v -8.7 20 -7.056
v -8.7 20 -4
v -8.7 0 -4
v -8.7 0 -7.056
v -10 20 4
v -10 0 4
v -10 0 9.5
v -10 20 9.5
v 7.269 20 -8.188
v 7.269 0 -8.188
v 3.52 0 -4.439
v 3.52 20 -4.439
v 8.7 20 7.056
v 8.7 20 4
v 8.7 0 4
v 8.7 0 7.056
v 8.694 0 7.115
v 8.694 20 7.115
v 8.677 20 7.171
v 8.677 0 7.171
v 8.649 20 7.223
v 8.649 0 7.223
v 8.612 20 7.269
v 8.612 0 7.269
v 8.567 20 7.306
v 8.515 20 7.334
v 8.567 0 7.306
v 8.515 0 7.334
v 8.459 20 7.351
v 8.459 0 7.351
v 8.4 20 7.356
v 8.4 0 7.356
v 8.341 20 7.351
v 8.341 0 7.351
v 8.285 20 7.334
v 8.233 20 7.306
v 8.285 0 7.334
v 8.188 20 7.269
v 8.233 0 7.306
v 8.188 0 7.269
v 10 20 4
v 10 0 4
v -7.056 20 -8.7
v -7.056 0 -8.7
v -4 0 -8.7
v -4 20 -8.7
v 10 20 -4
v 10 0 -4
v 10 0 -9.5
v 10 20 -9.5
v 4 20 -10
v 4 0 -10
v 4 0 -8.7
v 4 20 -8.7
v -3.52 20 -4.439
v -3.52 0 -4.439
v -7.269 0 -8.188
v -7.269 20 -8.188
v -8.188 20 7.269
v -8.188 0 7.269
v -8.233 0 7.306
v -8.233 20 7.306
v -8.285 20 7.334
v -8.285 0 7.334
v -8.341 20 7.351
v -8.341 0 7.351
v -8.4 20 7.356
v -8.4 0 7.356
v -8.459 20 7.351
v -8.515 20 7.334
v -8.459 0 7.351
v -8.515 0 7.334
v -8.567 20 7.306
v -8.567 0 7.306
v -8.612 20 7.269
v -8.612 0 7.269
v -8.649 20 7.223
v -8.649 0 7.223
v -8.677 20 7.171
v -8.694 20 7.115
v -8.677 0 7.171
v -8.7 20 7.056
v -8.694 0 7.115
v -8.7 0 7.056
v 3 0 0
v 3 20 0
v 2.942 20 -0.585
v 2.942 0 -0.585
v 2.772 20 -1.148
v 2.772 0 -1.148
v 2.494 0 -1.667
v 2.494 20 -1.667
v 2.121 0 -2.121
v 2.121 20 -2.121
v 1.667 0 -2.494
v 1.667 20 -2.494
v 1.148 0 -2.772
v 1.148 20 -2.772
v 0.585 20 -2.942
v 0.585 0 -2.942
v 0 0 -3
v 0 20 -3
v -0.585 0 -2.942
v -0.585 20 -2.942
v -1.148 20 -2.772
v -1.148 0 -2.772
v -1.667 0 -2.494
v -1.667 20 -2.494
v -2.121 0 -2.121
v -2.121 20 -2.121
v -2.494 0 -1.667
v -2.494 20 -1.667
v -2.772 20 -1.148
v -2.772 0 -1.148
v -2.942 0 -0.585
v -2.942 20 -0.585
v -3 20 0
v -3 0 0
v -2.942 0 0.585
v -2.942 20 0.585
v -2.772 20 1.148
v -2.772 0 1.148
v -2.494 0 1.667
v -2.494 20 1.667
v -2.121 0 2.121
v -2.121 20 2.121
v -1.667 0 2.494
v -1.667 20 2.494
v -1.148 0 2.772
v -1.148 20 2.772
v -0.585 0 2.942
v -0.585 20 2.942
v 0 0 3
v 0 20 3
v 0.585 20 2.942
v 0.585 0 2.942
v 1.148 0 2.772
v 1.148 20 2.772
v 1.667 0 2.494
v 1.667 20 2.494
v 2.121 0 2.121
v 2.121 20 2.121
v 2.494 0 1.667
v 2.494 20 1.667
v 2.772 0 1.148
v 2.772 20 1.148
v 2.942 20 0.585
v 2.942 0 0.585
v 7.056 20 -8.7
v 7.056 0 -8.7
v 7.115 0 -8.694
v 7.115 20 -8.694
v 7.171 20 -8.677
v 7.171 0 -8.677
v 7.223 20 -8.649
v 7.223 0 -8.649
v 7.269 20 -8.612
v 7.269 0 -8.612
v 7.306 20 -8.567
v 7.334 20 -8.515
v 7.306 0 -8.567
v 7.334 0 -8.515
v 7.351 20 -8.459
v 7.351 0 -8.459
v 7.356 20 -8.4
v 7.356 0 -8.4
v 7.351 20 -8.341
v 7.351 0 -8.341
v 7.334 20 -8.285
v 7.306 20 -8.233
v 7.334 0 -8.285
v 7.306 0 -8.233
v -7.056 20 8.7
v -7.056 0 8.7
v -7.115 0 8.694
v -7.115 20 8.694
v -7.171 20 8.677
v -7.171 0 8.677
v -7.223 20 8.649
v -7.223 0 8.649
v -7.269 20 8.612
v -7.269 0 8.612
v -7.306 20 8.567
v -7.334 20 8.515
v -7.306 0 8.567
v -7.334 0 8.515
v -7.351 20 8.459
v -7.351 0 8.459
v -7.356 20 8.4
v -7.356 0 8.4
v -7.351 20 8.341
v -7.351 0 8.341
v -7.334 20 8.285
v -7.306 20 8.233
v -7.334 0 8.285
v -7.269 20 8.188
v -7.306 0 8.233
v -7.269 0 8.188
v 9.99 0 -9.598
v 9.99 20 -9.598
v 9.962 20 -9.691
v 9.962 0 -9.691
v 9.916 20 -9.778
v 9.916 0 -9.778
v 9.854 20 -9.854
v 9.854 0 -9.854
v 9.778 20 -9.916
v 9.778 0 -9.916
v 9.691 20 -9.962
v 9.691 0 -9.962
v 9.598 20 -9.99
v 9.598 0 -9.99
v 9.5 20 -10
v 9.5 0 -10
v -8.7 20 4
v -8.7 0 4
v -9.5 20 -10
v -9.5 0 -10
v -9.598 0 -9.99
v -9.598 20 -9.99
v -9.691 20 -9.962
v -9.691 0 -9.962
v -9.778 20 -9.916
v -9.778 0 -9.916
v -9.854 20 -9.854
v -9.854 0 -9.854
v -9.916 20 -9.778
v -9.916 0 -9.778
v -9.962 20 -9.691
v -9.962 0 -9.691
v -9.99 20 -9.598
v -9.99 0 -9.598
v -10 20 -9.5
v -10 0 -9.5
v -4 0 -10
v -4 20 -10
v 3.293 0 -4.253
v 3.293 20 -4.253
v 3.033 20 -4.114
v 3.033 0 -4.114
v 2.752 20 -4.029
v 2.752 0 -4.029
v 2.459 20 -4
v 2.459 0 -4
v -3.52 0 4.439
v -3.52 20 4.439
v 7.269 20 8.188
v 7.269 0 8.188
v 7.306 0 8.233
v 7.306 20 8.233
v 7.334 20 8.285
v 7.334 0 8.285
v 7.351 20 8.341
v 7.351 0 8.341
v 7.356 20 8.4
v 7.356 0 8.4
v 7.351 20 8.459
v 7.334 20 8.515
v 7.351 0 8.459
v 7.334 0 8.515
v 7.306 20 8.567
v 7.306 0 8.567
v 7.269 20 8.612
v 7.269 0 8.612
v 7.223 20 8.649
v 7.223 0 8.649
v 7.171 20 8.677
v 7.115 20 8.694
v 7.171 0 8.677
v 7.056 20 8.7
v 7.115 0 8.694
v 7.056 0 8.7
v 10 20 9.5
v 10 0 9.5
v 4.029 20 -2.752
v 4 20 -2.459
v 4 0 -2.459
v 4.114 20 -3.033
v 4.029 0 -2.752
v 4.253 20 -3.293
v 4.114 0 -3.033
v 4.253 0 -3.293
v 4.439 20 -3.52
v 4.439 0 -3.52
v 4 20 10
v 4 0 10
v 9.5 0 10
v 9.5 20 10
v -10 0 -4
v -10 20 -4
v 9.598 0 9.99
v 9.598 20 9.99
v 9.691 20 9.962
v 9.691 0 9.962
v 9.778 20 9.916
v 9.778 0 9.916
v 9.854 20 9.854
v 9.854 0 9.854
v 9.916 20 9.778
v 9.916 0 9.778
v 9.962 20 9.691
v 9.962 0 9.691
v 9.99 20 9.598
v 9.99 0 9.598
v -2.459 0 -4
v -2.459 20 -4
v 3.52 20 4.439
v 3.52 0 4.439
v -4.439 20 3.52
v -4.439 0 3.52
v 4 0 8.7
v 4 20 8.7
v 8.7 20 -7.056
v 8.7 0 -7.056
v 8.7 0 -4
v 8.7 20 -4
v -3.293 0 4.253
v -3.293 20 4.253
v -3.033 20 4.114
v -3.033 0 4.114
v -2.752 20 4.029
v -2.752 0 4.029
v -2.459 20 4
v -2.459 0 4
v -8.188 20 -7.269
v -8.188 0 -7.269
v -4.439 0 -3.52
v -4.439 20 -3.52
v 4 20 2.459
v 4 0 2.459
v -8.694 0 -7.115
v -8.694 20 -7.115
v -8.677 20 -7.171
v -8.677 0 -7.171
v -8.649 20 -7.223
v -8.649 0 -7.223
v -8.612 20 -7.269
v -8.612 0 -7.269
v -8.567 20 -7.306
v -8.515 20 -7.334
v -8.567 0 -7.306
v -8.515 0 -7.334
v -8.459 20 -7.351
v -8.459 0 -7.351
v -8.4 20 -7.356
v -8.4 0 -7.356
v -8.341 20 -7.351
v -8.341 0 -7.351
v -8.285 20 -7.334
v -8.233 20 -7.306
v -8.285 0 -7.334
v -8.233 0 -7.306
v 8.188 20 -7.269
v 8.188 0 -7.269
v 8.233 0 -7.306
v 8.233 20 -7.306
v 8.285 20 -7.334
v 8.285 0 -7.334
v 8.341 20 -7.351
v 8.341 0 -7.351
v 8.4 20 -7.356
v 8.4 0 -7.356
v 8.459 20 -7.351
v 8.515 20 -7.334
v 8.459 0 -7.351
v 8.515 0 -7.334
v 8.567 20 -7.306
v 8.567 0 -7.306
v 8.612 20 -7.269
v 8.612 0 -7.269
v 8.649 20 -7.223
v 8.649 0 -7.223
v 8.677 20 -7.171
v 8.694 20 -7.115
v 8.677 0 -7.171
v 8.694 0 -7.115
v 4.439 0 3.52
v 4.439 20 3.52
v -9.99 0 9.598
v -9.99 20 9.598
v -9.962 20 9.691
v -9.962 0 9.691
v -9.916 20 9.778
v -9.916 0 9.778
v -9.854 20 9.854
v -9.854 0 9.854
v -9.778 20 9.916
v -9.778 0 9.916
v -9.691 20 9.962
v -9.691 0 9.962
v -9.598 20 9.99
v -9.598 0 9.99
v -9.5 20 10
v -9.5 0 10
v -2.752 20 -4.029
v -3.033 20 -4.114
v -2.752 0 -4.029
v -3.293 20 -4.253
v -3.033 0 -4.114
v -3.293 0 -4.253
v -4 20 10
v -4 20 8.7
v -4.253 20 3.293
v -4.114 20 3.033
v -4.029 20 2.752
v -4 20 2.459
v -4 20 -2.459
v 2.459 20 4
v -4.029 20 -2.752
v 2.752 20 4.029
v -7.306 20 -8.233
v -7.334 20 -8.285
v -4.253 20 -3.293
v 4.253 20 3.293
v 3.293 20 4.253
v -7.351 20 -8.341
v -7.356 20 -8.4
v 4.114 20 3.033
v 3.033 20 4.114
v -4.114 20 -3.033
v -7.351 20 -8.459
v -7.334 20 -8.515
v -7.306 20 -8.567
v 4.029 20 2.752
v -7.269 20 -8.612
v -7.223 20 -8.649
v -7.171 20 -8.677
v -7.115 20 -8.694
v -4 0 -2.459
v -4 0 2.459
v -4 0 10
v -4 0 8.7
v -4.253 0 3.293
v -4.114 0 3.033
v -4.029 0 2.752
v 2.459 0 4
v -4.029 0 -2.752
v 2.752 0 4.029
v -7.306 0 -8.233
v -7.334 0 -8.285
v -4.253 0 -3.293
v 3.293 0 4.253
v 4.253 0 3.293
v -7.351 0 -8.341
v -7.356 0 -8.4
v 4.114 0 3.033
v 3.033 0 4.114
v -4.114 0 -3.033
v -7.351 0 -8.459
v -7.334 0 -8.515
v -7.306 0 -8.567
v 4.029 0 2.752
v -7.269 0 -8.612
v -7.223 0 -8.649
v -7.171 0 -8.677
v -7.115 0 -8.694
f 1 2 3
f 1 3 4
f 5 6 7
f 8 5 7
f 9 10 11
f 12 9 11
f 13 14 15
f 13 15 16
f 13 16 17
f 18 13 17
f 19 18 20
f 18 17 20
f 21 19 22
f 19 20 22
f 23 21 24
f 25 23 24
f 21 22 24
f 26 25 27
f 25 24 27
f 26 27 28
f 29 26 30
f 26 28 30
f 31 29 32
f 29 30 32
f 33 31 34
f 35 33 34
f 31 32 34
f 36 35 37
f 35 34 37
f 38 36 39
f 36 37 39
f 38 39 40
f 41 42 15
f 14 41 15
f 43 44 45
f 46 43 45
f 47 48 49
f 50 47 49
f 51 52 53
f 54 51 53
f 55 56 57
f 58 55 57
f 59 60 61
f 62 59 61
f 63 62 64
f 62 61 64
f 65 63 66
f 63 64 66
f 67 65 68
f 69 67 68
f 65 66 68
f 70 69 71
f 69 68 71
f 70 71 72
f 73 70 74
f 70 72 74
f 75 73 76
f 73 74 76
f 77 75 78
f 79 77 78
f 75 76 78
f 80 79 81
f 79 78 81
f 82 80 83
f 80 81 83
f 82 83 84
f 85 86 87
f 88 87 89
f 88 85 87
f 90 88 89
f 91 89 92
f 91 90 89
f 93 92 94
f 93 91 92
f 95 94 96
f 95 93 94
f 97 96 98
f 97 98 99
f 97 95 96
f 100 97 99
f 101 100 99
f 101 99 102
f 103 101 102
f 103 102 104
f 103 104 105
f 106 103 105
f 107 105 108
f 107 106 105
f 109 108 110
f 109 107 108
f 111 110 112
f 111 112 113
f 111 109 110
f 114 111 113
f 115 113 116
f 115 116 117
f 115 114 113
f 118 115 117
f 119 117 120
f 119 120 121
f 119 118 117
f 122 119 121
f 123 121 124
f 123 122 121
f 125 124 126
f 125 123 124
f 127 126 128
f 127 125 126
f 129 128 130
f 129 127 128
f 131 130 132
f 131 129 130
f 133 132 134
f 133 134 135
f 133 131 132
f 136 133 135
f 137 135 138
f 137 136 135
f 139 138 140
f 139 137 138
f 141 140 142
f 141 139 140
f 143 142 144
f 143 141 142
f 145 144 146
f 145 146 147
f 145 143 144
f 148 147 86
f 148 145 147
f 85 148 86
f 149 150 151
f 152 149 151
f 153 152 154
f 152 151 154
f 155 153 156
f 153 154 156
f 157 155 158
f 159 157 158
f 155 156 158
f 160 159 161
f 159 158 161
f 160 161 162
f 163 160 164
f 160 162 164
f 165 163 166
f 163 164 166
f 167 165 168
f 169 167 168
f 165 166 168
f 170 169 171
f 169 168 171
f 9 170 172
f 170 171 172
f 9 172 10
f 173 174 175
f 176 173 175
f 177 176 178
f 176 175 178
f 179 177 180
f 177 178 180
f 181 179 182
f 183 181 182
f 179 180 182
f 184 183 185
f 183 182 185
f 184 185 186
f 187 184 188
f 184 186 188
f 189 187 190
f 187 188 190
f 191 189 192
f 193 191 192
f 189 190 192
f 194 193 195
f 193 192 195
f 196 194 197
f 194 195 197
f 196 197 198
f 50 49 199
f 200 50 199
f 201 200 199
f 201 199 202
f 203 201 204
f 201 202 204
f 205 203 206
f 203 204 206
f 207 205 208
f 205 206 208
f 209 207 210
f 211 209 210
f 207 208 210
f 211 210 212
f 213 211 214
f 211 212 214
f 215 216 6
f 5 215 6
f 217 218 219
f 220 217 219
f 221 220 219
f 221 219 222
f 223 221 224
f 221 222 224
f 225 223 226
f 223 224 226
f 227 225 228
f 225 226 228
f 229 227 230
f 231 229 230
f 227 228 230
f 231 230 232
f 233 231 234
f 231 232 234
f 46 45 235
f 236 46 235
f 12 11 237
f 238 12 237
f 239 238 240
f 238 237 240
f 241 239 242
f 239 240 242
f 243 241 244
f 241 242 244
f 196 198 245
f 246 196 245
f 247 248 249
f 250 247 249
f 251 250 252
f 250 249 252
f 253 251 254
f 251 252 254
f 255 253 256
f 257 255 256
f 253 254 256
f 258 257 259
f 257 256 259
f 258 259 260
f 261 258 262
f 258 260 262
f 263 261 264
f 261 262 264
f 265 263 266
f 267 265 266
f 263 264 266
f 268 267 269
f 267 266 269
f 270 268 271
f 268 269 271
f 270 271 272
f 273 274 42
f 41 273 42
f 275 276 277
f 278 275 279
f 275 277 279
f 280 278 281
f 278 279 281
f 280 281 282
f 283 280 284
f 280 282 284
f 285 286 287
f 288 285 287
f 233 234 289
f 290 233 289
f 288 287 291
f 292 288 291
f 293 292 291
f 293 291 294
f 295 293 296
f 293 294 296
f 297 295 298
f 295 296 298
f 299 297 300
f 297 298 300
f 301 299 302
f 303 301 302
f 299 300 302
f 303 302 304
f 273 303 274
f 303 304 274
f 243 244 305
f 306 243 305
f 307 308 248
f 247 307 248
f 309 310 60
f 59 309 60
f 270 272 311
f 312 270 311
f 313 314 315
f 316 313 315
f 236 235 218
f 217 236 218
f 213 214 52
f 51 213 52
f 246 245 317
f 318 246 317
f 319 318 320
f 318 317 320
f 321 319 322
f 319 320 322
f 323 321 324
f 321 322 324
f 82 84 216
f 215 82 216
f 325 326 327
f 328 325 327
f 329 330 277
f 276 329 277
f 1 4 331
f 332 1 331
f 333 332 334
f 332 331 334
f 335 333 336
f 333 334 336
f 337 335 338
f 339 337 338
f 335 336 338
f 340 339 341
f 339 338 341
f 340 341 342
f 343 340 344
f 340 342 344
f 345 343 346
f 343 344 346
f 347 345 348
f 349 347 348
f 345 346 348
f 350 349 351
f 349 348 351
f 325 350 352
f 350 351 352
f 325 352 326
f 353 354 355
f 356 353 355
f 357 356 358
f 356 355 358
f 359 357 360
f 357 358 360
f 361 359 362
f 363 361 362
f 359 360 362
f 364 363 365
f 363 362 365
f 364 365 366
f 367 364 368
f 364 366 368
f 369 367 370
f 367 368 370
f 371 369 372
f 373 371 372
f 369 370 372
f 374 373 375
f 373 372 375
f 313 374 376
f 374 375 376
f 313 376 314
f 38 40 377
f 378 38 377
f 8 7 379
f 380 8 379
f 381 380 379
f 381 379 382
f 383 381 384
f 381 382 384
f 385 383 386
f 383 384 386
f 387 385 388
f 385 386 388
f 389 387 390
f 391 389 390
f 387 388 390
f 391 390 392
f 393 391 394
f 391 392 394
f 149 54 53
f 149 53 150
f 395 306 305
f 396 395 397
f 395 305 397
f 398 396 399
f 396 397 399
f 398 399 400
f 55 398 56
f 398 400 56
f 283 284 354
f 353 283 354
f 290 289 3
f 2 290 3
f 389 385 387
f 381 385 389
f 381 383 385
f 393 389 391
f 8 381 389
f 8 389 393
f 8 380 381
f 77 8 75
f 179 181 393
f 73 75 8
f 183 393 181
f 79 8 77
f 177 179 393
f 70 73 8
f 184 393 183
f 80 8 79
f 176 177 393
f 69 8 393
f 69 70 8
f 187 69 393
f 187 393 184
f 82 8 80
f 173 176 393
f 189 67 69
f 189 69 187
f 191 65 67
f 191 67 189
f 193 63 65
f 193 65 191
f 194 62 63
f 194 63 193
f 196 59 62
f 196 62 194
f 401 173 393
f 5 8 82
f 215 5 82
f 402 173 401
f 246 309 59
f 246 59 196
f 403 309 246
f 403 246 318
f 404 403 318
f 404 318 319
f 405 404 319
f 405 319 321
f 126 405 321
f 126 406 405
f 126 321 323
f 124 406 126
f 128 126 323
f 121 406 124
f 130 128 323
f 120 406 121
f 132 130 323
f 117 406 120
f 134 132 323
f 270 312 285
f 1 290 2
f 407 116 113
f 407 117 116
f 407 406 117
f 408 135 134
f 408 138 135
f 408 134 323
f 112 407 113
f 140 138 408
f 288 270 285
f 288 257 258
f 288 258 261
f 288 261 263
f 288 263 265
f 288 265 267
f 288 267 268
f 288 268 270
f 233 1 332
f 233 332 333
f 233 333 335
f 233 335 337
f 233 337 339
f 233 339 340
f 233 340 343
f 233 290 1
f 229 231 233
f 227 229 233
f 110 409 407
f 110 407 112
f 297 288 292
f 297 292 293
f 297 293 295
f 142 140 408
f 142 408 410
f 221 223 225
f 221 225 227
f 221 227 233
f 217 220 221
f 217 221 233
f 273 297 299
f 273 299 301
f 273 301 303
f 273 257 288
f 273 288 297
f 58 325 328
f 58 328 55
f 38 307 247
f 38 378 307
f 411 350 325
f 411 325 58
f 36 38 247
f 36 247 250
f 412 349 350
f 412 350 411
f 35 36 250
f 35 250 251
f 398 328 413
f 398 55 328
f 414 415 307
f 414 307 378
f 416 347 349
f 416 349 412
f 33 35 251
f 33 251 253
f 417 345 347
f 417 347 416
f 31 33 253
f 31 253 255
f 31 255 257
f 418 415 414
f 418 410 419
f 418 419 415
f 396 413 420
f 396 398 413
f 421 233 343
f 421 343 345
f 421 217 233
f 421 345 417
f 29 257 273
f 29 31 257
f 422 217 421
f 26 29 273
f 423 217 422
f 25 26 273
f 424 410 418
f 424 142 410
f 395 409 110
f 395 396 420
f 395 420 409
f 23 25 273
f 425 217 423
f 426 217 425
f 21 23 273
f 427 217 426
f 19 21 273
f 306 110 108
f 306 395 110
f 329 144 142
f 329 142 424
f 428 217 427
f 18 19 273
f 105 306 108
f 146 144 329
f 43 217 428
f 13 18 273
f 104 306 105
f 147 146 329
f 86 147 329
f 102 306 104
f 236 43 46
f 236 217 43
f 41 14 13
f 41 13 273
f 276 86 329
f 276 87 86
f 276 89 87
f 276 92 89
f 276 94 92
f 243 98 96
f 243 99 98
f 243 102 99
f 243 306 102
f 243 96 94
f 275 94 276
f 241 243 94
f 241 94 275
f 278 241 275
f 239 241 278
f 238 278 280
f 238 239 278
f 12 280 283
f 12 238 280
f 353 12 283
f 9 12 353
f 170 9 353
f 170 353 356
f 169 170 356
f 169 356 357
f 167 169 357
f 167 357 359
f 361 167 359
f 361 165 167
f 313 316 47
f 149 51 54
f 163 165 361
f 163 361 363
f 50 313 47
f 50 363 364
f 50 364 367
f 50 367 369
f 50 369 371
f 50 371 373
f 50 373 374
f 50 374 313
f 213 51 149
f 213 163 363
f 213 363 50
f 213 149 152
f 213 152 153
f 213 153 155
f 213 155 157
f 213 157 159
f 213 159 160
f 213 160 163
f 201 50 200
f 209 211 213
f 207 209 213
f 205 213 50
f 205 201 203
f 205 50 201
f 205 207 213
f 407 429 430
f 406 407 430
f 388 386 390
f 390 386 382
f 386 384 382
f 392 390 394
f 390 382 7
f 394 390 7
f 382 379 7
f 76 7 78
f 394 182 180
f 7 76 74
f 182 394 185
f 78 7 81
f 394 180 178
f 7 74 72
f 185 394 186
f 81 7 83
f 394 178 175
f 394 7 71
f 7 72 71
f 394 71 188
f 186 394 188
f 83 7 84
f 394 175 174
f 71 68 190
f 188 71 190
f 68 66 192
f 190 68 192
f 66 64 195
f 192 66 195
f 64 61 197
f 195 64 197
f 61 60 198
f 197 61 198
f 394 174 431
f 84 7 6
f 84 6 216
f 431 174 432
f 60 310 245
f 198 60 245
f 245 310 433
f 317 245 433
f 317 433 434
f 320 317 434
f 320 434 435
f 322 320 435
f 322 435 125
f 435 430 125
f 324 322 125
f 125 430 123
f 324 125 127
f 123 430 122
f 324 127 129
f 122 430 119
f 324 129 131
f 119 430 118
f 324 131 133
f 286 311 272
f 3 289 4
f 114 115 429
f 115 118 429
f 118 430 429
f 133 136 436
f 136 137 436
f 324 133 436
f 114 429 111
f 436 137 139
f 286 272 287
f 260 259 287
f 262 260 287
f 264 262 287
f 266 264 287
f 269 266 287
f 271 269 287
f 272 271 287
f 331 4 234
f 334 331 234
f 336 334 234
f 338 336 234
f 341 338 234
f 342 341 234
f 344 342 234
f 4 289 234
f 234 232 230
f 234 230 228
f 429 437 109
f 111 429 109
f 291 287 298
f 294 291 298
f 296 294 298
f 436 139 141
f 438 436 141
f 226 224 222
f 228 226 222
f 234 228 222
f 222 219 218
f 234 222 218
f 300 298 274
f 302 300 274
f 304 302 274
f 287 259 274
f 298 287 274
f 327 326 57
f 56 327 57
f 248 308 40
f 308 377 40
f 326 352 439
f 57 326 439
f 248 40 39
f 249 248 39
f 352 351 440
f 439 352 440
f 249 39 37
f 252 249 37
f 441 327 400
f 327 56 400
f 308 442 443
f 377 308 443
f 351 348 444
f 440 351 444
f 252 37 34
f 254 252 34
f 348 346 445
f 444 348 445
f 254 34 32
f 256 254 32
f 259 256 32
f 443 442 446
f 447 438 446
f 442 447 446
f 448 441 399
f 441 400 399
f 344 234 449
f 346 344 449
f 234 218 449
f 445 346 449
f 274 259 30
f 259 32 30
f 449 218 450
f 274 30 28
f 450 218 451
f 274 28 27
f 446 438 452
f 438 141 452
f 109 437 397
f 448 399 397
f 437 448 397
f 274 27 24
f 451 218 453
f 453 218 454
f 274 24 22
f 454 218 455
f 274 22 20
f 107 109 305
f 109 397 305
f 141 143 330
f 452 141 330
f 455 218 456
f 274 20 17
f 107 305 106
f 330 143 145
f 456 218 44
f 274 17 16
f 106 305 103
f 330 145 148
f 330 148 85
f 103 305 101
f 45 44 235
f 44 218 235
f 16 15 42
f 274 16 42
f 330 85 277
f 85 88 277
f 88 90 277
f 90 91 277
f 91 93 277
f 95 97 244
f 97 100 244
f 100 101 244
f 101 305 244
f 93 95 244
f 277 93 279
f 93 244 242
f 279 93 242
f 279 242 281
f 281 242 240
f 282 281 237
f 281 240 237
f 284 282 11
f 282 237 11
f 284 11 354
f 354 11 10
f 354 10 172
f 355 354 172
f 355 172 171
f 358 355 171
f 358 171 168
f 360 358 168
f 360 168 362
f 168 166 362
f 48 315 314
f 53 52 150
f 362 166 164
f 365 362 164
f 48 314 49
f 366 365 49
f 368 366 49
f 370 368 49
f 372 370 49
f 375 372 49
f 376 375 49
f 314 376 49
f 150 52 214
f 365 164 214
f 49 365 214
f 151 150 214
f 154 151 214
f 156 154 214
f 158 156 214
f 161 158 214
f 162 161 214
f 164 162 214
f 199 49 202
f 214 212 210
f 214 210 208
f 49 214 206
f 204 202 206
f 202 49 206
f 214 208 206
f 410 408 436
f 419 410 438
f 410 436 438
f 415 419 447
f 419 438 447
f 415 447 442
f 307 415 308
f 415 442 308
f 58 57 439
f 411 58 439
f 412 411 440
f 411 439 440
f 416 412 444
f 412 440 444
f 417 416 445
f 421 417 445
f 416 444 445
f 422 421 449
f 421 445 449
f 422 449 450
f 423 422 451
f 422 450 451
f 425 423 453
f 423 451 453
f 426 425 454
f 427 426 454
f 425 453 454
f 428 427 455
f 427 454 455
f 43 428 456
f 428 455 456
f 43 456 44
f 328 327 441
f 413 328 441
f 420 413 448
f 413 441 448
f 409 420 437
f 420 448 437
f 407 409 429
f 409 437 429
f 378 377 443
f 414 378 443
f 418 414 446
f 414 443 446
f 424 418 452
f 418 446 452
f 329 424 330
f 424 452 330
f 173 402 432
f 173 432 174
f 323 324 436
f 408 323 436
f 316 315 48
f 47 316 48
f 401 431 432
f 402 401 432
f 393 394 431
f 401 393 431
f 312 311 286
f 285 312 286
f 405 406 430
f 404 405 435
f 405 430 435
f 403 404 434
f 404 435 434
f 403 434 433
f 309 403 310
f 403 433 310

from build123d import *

# Parameters (mm, degrees)
ESBO_O1_R                = 3
RESSALTO_EXTRUS_O1_DEPTH = 20


with BuildPart() as part:
    # Esboço1 → Ressalto-extrusão1 (new body)
    with BuildSketch(Plane(origin=(0, 0, 0), x_dir=(1, 0, 0), z_dir=(0, 1, 0))):
        with BuildLine():
            Line((-7.056497116, 8.7), (-4, 8.7))
            Line((-4, 8.7), (-4, 10))
            Line((-4, 10), (-9.5, 10))
            ThreePointArc((-9.5, 10), (-9.853553391, 9.853553391), (-10, 9.5))
            Line((-10, 9.5), (-10, 4))
            Line((-10, 4), (-8.7, 4))
            Line((-8.7, 4), (-8.7, 7.056497116))
            ThreePointArc((-8.7, 7.056497116), (-8.51480503, 7.333660975), (-8.187867966, 7.26862915))
            Line((-8.187867966, 7.26862915), (-4.439339828, 3.520101013))
            ThreePointArc((-4.439339828, 3.520101013), (-4.114180701, 3.033465989), (-4, 2.459440841))
            Line((-4, 2.459440841), (-4, -2.459440841))
            ThreePointArc((-4, -2.459440841), (-4.114180701, -3.033465989), (-4.439339828, -3.520101013))
            Line((-4.439339828, -3.520101013), (-8.187867966, -7.26862915))
            ThreePointArc((-8.187867966, -7.26862915), (-8.51480503, -7.333660975), (-8.7, -7.056497116))
            Line((-8.7, -7.056497116), (-8.7, -4))
            Line((-8.7, -4), (-10, -4))
            Line((-10, -4), (-10, -9.5))
            ThreePointArc((-10, -9.5), (-9.853553391, -9.853553391), (-9.5, -10))
            Line((-9.5, -10), (-4, -10))
            Line((-4, -10), (-4, -8.7))
            Line((-4, -8.7), (-7.056497116, -8.7))
            ThreePointArc((-7.056497116, -8.7), (-7.333660975, -8.51480503), (-7.26862915, -8.187867966))
            Line((-7.26862915, -8.187867966), (-3.520101013, -4.439339828))
            ThreePointArc((-3.520101013, -4.439339828), (-3.033465989, -4.114180701), (-2.459440841, -4))
            Line((-2.459440841, -4), (2.459440841, -4))
            ThreePointArc((2.459440841, -4), (3.033465989, -4.114180701), (3.520101013, -4.439339828))
            Line((3.520101013, -4.439339828), (7.26862915, -8.187867966))
            ThreePointArc((7.26862915, -8.187867966), (7.333660975, -8.51480503), (7.056497116, -8.7))
            Line((7.056497116, -8.7), (4, -8.7))
            Line((4, -8.7), (4, -10))
            Line((4, -10), (9.5, -10))
            ThreePointArc((9.5, -10), (9.853553391, -9.853553391), (10, -9.5))
            Line((10, -9.5), (10, -4))
            Line((10, -4), (8.7, -4))
            Line((8.7, -4), (8.7, -7.056497116))
            ThreePointArc((8.7, -7.056497116), (8.51480503, -7.333660975), (8.187867966, -7.26862915))
            Line((8.187867966, -7.26862915), (4.439339828, -3.520101013))
            ThreePointArc((4.439339828, -3.520101013), (4.114180701, -3.033465989), (4, -2.459440841))
            Line((4, -2.459440841), (4, 2.459440841))
            ThreePointArc((4, 2.459440841), (4.114180701, 3.033465989), (4.439339828, 3.520101013))
            Line((4.439339828, 3.520101013), (8.187867966, 7.26862915))
            ThreePointArc((8.187867966, 7.26862915), (8.51480503, 7.333660975), (8.7, 7.056497116))
            Line((8.7, 7.056497116), (8.7, 4))
            Line((8.7, 4), (10, 4))
            Line((10, 4), (10, 9.5))
            ThreePointArc((10, 9.5), (9.853553391, 9.853553391), (9.5, 10))
            Line((9.5, 10), (4, 10))
            Line((4, 10), (4, 8.7))
            Line((4, 8.7), (7.056497116, 8.7))
            ThreePointArc((7.056497116, 8.7), (7.333660975, 8.51480503), (7.26862915, 8.187867966))
            Line((7.26862915, 8.187867966), (3.520101013, 4.439339828))
            ThreePointArc((3.520101013, 4.439339828), (3.033465989, 4.114180701), (2.459440841, 4))
            Line((2.459440841, 4), (-2.459440841, 4))
            ThreePointArc((-2.459440841, 4), (-3.033465989, 4.114180701), (-3.520101013, 4.439339828))
            Line((-3.520101013, 4.439339828), (-7.26862915, 8.187867966))
            ThreePointArc((-7.26862915, 8.187867966), (-7.333660975, 8.51480503), (-7.056497116, 8.7))
        make_face()
        Circle(ESBO_O1_R, mode=Mode.SUBTRACT)
    extrude(amount=RESSALTO_EXTRUS_O1_DEPTH)


solid = part.part
